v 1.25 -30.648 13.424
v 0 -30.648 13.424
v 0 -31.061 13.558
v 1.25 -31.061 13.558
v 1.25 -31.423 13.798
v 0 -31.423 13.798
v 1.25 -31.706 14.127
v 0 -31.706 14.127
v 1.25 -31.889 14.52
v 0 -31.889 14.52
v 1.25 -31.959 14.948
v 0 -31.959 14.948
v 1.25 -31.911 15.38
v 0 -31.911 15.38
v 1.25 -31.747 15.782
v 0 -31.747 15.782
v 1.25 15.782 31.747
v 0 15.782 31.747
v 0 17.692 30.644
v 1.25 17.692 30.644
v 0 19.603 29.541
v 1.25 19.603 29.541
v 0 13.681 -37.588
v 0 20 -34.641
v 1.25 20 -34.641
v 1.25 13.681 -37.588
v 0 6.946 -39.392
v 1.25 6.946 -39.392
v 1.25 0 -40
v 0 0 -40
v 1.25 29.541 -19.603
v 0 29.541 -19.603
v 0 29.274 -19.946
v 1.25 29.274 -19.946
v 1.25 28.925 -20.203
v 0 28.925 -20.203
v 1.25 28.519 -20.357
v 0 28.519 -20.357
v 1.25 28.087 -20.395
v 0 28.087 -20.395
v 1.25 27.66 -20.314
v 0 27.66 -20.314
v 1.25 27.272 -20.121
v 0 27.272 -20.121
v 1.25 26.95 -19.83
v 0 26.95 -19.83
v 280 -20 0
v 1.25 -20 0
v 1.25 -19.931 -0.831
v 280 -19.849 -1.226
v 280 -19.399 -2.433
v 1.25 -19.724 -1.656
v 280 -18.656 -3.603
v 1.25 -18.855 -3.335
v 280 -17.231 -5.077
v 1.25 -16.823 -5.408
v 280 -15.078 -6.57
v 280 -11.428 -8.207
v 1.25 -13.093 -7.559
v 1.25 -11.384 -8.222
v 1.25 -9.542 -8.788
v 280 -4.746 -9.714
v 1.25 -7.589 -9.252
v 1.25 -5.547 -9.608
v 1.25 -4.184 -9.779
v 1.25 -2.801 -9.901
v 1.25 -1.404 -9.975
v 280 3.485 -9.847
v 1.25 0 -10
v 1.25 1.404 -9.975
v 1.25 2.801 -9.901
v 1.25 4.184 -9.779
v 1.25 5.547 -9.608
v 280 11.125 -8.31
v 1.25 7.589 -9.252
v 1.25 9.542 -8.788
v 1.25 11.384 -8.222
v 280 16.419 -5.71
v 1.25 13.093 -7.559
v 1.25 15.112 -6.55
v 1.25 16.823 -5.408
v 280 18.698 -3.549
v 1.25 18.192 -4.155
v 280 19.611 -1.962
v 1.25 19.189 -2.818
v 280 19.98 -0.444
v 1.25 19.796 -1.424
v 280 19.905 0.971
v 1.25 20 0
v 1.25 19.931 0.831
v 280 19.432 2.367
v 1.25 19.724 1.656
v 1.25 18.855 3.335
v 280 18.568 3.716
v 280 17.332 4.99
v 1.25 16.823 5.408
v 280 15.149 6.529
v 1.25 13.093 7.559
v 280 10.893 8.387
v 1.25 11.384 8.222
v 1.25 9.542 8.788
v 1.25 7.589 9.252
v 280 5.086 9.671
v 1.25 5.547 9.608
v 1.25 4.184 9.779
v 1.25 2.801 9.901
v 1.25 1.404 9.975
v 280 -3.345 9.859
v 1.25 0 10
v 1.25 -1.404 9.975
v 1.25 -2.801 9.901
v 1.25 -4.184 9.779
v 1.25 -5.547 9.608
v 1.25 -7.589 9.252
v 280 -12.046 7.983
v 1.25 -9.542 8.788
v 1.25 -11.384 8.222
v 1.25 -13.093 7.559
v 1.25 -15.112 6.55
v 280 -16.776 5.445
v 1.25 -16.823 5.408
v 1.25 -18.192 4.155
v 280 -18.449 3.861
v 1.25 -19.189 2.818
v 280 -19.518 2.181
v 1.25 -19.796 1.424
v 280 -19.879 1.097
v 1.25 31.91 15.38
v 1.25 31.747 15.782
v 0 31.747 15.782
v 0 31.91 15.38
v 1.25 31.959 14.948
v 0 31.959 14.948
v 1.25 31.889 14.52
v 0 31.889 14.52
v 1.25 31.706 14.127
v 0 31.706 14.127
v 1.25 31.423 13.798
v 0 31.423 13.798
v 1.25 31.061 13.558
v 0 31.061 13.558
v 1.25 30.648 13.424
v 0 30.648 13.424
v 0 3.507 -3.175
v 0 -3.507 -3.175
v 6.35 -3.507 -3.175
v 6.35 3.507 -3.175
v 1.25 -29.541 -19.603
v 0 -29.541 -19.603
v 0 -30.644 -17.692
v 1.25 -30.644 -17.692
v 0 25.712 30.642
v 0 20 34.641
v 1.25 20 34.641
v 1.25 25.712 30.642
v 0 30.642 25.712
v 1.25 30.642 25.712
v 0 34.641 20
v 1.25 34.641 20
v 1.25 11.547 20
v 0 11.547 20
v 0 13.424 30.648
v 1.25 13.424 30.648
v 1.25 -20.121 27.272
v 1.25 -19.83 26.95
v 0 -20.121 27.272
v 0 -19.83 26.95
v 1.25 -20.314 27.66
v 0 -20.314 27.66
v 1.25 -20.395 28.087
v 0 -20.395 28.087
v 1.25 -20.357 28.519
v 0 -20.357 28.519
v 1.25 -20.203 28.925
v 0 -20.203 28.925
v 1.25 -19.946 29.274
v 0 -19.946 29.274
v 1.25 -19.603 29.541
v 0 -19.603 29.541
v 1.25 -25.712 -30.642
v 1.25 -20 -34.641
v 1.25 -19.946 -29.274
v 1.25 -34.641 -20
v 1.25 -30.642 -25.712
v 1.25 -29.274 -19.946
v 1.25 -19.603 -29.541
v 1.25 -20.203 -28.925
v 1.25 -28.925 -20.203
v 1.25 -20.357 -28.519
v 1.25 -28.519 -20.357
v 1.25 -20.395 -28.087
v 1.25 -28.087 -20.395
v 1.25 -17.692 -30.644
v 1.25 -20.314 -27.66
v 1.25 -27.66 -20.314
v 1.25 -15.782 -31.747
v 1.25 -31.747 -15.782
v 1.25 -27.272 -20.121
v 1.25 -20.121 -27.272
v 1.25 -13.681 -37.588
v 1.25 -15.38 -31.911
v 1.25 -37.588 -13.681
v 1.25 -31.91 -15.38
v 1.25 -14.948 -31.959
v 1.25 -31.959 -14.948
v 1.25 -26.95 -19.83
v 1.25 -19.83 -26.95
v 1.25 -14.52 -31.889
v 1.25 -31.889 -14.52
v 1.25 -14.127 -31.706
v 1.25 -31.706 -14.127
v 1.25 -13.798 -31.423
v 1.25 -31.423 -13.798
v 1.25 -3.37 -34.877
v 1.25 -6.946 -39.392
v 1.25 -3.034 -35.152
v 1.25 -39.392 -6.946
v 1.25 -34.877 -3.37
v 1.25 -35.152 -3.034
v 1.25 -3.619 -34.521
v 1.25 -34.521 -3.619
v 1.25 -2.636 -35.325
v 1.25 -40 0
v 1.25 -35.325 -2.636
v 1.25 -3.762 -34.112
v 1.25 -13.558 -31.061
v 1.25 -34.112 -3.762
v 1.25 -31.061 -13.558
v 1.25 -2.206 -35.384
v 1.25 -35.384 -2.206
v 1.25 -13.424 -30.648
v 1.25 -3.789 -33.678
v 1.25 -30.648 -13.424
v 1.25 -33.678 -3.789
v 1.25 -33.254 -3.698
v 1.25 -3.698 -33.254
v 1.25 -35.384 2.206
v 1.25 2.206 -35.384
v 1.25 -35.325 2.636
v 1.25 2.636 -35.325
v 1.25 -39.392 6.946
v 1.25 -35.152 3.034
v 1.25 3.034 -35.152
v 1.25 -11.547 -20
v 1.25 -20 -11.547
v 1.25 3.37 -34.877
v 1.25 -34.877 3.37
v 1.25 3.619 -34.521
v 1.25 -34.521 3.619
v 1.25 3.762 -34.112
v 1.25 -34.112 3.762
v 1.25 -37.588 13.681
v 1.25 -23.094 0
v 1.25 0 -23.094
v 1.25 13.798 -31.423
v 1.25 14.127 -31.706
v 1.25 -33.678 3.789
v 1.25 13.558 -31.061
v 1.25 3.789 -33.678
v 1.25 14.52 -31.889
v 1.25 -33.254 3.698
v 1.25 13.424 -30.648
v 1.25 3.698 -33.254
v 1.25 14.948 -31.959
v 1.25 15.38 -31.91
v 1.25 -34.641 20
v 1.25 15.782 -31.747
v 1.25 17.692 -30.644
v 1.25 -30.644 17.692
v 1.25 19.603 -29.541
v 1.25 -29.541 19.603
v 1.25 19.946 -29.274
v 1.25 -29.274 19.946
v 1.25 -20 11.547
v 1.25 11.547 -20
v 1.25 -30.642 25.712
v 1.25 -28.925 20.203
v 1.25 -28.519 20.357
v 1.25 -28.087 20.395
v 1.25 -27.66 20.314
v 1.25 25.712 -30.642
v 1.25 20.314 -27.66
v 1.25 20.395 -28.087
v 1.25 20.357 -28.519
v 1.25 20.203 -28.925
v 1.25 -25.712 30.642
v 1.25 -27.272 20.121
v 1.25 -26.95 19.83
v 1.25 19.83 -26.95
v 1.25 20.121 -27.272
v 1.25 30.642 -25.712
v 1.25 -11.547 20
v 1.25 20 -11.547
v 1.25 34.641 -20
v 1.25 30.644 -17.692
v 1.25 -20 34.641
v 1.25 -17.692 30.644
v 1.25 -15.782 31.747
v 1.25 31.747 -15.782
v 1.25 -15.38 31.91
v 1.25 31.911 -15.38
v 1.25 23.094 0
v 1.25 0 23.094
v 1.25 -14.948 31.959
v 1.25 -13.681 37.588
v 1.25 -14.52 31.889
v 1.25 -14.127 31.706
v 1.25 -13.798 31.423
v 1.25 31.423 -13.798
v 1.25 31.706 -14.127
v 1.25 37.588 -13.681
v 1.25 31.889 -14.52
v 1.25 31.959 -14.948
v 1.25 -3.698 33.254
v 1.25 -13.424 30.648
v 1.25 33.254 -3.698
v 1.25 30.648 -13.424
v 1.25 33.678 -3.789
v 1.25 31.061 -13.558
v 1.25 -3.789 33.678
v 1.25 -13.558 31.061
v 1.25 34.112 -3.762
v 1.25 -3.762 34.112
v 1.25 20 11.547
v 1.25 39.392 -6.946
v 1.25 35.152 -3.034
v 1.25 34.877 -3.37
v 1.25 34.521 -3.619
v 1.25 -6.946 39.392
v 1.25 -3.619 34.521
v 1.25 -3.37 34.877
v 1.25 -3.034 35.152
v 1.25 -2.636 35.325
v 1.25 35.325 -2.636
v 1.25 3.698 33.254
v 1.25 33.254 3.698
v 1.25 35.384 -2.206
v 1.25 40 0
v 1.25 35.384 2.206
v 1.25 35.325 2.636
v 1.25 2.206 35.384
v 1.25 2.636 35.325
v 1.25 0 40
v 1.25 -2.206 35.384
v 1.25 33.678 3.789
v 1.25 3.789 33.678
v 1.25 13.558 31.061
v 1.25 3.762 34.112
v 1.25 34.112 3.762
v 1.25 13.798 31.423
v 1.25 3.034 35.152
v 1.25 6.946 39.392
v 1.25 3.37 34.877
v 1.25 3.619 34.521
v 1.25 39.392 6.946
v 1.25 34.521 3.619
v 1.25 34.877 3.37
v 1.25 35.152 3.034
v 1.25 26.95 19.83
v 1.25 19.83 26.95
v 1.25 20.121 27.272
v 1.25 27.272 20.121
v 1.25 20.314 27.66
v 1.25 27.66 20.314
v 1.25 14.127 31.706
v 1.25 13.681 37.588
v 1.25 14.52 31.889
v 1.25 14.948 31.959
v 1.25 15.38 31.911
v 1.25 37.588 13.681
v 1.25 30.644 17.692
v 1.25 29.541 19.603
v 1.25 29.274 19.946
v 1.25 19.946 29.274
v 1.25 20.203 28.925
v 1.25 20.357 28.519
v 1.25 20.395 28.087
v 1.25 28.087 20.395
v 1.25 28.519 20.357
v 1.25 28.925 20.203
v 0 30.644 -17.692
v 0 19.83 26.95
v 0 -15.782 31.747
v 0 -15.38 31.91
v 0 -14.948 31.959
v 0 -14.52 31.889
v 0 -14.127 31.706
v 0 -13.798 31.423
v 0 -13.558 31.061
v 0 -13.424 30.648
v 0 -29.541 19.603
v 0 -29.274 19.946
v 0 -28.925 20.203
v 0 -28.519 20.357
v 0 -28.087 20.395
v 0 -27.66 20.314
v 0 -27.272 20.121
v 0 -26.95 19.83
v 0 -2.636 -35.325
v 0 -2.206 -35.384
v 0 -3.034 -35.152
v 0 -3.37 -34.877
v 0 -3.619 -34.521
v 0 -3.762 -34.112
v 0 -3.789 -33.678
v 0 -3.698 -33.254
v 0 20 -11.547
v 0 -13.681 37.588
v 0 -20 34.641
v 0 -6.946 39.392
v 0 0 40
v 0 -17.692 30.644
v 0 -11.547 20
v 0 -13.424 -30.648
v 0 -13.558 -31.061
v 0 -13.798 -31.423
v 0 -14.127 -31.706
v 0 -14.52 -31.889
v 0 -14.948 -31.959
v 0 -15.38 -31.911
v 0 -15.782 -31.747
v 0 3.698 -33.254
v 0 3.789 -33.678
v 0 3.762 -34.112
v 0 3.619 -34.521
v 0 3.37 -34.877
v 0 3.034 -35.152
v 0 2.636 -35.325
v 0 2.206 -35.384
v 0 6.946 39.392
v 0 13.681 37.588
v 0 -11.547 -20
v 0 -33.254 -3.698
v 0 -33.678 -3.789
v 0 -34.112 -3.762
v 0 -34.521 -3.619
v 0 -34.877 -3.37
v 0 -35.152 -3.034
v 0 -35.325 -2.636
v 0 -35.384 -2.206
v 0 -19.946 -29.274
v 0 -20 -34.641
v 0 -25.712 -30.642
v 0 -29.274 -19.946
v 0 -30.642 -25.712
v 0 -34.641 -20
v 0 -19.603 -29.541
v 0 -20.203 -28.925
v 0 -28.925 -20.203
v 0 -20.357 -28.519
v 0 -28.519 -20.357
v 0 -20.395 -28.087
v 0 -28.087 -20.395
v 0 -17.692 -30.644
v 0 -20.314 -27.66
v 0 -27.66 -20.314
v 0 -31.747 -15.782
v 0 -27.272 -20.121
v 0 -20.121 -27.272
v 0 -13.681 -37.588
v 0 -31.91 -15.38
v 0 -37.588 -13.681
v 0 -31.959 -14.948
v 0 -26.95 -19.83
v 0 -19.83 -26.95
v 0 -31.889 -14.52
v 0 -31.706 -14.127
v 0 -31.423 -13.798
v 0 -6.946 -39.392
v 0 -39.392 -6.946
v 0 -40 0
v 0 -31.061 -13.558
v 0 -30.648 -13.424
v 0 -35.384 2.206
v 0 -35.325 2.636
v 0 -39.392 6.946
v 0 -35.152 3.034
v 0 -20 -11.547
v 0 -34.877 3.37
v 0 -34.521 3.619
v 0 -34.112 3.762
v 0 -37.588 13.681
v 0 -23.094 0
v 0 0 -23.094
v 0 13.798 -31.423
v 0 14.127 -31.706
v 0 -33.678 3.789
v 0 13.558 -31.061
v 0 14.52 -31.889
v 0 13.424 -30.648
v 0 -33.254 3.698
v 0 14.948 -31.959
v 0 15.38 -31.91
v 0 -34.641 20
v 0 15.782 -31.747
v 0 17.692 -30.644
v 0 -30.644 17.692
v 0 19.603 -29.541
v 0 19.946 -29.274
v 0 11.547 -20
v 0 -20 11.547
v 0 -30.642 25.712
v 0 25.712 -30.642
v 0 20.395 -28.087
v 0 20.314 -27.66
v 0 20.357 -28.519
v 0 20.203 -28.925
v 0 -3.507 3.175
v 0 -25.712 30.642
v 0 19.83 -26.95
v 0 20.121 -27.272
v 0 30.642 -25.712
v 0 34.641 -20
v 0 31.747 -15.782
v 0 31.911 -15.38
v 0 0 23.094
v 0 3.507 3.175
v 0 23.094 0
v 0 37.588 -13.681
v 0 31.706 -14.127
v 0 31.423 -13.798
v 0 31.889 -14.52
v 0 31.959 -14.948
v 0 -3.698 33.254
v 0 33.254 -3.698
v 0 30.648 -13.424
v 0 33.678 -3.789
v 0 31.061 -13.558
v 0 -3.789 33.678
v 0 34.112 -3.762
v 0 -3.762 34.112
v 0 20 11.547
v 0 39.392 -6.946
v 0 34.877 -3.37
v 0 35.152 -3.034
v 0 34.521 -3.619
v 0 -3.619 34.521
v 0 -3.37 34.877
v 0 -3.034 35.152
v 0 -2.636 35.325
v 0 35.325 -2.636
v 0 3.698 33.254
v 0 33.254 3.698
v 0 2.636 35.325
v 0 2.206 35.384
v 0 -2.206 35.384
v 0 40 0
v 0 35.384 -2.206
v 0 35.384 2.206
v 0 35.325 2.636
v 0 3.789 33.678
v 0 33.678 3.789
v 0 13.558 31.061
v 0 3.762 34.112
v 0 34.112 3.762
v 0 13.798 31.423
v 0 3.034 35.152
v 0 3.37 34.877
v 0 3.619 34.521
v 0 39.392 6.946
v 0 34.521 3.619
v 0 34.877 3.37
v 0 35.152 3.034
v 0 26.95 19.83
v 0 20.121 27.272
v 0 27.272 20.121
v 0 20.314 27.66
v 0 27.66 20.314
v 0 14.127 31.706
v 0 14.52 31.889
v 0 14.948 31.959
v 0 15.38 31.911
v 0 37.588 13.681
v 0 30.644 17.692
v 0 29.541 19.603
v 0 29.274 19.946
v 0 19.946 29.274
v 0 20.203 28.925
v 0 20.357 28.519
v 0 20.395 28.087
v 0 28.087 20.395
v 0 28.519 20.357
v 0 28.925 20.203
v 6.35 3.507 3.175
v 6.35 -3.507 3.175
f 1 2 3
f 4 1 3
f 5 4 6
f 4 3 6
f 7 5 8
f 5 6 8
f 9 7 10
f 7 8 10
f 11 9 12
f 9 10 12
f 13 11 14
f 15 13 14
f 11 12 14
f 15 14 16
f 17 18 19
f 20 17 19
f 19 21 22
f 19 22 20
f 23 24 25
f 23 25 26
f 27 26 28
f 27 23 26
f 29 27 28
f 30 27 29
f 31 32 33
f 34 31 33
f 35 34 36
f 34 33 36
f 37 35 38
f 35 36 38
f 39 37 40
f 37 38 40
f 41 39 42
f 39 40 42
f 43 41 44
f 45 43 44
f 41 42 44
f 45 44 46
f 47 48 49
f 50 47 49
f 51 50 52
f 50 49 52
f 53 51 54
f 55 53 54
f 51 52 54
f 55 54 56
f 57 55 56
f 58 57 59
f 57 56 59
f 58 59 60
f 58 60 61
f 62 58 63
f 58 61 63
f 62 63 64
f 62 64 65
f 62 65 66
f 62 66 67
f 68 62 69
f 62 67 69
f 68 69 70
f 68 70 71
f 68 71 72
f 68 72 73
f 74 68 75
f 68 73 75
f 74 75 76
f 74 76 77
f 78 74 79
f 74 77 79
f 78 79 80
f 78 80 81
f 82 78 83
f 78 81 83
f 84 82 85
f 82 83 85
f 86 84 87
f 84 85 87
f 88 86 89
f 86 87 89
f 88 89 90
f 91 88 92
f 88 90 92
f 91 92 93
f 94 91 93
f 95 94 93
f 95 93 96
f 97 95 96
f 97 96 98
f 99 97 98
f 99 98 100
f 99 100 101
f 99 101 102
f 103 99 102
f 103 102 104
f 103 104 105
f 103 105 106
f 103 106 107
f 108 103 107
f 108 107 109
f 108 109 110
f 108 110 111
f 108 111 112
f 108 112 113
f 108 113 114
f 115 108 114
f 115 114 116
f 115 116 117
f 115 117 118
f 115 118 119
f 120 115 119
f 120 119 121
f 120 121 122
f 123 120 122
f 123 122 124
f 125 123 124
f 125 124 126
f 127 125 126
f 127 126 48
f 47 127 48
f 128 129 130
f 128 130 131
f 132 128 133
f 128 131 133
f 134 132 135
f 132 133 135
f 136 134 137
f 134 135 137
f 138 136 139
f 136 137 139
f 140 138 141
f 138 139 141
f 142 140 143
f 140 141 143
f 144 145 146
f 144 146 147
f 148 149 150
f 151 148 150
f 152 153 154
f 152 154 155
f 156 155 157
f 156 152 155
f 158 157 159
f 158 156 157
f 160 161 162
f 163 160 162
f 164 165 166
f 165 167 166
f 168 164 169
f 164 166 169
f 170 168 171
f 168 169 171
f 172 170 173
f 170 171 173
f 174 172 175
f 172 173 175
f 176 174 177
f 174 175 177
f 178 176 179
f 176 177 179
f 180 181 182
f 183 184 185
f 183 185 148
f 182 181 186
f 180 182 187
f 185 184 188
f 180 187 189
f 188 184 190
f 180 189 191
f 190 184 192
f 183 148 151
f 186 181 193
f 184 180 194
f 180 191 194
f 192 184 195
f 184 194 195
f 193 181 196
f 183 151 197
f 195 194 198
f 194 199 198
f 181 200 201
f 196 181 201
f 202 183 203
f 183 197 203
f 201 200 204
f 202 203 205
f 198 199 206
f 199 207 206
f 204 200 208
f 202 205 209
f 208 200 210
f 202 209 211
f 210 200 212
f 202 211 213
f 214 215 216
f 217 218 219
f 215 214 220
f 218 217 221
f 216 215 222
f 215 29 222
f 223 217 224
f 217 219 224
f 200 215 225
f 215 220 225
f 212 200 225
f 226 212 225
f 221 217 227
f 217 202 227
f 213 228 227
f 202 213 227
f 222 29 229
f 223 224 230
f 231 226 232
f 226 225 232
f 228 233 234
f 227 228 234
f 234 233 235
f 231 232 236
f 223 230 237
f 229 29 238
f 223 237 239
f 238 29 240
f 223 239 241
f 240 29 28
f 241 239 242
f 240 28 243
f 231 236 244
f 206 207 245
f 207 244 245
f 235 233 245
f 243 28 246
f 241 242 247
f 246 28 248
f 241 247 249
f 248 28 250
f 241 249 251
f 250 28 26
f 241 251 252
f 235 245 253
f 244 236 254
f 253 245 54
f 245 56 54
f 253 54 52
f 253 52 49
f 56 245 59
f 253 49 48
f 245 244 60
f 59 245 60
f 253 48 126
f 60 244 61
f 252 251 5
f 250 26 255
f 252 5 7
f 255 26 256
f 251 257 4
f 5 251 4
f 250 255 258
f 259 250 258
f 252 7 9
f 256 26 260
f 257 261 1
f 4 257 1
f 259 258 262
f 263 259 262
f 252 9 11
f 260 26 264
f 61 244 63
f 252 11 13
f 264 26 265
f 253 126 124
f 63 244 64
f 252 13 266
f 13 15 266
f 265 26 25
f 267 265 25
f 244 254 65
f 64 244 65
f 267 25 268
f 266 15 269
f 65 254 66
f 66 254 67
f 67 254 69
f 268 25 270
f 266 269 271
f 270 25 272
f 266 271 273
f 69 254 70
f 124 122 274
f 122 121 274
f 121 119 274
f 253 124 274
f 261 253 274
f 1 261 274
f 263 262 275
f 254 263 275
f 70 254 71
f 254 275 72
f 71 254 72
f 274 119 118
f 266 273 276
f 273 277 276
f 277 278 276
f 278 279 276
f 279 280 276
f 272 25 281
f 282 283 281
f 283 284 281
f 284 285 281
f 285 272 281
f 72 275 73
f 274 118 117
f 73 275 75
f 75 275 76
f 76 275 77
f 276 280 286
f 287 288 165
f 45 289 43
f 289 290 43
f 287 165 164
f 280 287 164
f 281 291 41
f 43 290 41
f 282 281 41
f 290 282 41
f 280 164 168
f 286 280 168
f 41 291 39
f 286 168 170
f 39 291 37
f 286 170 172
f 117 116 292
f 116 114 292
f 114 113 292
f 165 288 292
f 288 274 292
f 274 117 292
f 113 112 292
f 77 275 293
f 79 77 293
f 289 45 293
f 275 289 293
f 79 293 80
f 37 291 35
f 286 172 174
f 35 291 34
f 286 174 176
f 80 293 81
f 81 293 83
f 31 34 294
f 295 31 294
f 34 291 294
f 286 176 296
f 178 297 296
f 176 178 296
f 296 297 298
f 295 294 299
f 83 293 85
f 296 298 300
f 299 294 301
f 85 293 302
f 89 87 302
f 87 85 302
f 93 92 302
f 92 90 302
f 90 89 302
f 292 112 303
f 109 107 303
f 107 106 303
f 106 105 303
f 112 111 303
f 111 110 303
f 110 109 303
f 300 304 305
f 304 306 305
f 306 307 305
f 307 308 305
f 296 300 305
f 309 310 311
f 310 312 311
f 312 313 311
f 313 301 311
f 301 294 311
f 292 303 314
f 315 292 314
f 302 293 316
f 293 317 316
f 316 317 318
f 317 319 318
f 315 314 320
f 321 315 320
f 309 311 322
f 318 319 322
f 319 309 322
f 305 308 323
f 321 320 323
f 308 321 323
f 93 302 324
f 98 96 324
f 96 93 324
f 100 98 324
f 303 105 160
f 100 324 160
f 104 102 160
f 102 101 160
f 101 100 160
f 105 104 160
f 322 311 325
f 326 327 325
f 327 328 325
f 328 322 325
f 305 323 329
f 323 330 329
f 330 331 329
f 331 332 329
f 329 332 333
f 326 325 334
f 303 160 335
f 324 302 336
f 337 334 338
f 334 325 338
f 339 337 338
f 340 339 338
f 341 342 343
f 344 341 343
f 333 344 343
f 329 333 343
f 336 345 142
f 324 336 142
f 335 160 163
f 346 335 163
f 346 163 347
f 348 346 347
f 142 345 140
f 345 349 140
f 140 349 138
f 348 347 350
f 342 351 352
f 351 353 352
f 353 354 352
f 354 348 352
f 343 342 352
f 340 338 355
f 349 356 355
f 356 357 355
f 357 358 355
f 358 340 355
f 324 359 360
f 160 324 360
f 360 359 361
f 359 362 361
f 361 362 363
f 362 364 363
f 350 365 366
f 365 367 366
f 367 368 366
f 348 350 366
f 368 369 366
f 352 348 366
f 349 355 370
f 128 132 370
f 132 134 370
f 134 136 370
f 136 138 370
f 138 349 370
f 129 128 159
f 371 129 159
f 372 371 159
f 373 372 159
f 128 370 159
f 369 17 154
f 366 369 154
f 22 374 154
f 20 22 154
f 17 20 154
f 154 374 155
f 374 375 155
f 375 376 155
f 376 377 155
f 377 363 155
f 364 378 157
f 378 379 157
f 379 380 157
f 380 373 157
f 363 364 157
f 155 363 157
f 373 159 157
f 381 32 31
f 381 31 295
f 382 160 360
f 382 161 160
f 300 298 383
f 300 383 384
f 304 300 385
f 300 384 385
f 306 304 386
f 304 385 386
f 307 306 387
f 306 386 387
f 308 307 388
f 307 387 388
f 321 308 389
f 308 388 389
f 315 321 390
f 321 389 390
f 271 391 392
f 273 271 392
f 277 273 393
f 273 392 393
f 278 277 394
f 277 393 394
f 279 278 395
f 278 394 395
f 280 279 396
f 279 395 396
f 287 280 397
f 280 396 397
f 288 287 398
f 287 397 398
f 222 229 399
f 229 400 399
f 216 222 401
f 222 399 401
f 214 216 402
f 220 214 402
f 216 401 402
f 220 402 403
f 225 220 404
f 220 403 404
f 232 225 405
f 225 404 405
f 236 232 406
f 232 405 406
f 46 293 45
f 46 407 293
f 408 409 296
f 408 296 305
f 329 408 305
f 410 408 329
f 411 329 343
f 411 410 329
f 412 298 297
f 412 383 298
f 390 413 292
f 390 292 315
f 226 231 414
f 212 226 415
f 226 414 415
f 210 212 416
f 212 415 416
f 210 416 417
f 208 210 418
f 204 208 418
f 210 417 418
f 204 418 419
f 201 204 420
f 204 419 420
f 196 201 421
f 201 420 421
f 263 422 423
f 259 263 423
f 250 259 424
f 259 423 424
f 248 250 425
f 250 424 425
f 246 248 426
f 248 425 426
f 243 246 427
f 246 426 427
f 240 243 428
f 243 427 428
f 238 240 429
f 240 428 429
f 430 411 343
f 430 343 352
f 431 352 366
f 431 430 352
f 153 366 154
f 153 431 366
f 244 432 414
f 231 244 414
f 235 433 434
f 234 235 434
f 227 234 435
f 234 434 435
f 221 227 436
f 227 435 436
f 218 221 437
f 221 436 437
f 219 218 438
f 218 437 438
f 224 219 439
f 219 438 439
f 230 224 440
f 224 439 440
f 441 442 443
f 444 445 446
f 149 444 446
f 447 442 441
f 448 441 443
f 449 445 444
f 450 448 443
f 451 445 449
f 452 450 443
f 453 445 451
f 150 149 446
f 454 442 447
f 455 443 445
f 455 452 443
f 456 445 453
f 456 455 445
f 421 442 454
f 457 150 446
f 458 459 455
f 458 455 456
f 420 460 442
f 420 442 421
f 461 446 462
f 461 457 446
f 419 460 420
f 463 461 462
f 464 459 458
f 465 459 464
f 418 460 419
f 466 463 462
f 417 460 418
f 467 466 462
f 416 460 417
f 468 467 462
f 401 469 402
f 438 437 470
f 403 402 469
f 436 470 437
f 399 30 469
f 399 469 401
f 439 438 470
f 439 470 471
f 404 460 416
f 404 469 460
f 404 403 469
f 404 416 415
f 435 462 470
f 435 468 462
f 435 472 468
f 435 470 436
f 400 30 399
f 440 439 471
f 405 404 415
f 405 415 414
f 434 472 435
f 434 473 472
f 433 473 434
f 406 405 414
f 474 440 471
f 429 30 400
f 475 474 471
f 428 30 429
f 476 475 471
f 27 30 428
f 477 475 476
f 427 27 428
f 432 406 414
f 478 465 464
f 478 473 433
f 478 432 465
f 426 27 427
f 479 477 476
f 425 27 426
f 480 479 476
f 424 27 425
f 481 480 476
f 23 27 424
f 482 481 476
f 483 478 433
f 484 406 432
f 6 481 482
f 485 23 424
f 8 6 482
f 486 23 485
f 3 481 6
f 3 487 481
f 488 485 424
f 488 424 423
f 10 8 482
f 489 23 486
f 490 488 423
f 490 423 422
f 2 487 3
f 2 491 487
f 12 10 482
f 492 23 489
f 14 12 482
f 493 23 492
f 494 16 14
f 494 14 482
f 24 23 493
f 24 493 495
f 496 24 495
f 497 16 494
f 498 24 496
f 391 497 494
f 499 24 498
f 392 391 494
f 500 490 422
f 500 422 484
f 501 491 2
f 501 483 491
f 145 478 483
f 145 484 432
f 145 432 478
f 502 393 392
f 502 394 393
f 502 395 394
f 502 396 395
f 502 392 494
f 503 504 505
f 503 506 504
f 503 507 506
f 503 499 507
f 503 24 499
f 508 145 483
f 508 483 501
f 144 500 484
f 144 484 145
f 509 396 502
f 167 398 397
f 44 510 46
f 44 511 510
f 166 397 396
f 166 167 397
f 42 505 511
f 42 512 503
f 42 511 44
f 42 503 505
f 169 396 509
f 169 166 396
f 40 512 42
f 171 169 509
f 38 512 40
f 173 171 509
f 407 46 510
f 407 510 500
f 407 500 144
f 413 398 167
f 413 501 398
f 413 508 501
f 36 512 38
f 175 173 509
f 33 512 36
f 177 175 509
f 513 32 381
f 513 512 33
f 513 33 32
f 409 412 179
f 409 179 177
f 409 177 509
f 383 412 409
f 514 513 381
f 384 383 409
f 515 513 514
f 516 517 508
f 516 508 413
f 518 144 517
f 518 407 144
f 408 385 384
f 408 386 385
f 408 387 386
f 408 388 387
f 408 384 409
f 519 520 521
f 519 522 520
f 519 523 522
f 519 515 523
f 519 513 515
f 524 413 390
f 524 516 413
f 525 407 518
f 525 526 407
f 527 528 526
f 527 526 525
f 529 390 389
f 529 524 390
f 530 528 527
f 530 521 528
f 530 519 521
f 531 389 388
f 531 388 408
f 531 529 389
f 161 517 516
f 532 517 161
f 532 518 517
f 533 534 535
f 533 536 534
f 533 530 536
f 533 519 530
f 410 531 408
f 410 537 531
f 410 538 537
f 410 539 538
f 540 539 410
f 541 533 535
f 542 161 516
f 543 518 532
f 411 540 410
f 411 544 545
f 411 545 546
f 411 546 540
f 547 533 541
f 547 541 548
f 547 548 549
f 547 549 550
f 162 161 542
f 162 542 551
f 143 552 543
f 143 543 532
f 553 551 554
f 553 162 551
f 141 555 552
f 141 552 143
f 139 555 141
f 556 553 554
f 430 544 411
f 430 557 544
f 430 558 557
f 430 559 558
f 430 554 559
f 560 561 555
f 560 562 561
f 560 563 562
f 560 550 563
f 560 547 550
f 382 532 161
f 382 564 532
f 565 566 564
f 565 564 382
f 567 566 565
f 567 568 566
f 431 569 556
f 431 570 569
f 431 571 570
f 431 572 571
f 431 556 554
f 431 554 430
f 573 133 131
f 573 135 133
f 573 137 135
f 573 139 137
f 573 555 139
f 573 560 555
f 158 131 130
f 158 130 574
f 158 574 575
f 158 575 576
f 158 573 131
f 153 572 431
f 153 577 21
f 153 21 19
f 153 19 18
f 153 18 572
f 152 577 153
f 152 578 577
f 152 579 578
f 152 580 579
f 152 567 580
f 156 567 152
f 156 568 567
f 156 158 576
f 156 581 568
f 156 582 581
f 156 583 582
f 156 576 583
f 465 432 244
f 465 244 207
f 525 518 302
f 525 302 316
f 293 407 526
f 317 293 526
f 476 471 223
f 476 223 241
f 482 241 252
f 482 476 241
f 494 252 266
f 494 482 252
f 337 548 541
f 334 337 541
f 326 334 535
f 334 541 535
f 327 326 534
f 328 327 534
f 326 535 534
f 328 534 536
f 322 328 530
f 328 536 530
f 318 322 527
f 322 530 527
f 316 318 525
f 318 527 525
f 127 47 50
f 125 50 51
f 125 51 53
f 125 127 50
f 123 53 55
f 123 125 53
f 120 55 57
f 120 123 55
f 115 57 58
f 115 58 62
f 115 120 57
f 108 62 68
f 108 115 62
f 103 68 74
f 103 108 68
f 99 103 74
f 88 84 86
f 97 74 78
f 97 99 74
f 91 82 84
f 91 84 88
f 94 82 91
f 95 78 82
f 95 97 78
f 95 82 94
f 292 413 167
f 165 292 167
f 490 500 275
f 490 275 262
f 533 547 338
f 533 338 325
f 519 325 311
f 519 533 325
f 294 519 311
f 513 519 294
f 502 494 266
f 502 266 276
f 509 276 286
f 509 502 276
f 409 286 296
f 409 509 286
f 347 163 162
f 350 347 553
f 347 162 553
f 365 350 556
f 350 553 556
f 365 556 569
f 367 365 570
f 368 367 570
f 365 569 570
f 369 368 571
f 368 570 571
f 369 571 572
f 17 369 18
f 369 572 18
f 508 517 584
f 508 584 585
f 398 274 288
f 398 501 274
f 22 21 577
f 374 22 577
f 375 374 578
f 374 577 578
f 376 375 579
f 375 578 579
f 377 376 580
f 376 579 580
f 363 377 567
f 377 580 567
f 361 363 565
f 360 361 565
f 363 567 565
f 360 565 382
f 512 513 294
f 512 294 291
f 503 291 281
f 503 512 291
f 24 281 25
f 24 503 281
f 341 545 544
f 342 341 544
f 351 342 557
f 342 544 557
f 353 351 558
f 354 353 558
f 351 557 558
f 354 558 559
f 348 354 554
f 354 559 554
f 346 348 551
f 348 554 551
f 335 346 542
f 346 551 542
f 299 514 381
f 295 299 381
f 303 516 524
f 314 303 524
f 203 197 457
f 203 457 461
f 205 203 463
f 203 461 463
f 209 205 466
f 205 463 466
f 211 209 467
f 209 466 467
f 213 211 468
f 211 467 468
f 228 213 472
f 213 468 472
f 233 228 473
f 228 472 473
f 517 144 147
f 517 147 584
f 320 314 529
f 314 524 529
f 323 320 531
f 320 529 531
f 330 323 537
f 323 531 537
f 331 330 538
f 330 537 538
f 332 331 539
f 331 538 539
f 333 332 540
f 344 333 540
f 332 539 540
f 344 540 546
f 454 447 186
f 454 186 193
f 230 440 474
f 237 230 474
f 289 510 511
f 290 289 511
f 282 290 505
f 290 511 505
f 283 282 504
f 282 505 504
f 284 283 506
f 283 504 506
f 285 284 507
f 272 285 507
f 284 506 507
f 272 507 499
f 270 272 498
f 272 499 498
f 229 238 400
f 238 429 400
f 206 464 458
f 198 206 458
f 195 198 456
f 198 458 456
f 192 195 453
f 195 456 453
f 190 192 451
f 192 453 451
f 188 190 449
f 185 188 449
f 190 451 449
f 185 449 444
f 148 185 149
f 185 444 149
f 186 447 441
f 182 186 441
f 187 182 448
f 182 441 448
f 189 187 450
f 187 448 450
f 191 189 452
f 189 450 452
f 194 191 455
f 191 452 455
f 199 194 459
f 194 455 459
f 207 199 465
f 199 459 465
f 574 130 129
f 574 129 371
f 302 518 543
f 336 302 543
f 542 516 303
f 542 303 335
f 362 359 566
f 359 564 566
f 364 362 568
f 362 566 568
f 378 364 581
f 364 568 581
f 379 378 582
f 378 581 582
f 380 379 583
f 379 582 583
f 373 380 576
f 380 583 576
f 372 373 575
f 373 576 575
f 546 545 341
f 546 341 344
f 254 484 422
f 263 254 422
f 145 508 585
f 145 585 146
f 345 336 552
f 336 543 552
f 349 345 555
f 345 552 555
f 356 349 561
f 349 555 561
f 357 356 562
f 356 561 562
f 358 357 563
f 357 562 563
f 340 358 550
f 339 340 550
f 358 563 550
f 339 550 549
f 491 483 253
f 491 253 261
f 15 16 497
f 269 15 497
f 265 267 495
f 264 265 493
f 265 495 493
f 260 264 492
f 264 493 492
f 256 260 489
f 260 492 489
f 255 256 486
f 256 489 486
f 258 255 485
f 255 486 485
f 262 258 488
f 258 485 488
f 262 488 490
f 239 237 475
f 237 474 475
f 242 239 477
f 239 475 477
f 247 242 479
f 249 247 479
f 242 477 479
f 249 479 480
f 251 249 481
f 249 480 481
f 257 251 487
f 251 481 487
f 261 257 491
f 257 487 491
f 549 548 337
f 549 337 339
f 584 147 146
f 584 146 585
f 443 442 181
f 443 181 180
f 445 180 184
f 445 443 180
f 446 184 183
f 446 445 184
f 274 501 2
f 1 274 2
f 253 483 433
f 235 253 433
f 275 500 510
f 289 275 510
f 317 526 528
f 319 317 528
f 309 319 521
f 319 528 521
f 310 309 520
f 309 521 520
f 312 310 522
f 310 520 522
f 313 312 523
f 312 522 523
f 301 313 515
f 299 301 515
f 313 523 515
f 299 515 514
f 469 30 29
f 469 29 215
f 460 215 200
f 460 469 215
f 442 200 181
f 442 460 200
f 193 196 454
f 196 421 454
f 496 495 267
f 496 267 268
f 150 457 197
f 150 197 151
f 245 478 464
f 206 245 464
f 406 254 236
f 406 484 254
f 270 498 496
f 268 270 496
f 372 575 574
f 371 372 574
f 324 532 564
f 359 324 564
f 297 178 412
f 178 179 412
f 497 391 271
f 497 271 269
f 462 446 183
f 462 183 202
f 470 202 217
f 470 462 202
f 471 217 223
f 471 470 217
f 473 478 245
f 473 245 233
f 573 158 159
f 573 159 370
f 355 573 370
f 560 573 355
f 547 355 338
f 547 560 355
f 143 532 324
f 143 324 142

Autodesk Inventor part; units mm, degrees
ref_plane "YZ Plane" through (0, 0, 0) normal (1, 0, 0) x (0, 1, 0)
ref_plane "XZ Plane" through (0, 0, 0) normal (0, 1, 0) x (-1, 0, 0)
ref_plane "XY Plane" through (0, 0, 0) normal (0, 0, 1) x (1, 0, 0)
sketch "Sketch4" plane through (0, 0, 0) normal (1, 0, 0) x (0, 1, 0)
  ellipse E0 centre (0, 0) end of major axis (-20, 0) minor radius 10
  dimension "d32" = 20
  dimension "d33" = 10
extrude "Extrusion1" add sketch "Sketch4" along normal blind 280
sketch "Sketch5" plane through (0, 0, 0) normal (-1, 0, 0) x (0, 0, 1)
  ellipse E0 centre (0, 0) end of major axis (0, 40) minor radius 40
  ellipse E1 centre (0, 0) end of major axis (0, -20) minor radius 10 projected
  line L0 (0, 0) -> (0, 40)
  line L1 (0, 0) -> (-20, 34.641)
  line L2 (0, 0) -> (-34.641, 20)
  line L3 (0, 0) -> (-40, 0)
  line L4 (0, 0) -> (-34.641, -20)
  line L5 (0, 0) -> (-20, -34.641)
  line L6 (0, 0) -> (0, -40)
  line L7 (0, 0) -> (20, -34.641)
  line L8 (0, 0) -> (34.641, -20)
  line L9 (0, 0) -> (40, 0)
  line L10 (0, 0) -> (34.641, 20)
  line L11 (0, 0) -> (20, 34.641)
  line L12 (0, 23.094) -> (3.6979, 33.254)
  line L13 (2.2062, 35.3845) -> (0, 35.3845)
  arc A0 (3.6979, 33.254) -> (2.2062, 35.3845) centre (2.2062, 33.797) ccw
  line L14 (0, 23.094) -> (-3.6979, 33.254)
  line L15 (-2.2062, 35.3845) -> (0, 35.3845)
  arc A1 (-2.2062, 35.3845) -> (-3.6979, 33.254) centre (-2.2062, 33.797) ccw
  line L16 (-15.7816, 31.7469) -> (-17.6922, 30.6438)
  line L17 (-19.6028, 29.5408) -> (-17.6922, 30.6438)
  arc A2 (-19.6028, 29.5408) -> (-19.8295, 26.9498) centre (-18.8091, 28.1659) ccw
  line L18 (-11.547, 20) -> (-19.8295, 26.9498)
  line L19 (-11.547, 20) -> (-13.4245, 30.6478)
  arc A3 (-13.4245, 30.6478) -> (-15.7816, 31.7469) centre (-14.9879, 30.3721) ccw
  line L20 (-29.5408, 19.6028) -> (-30.6438, 17.6922)
  line L21 (-31.7469, 15.7816) -> (-30.6438, 17.6922)
  arc A4 (-31.7469, 15.7816) -> (-30.6478, 13.4245) centre (-30.3721, 14.9879) ccw
  line L22 (-20, 11.547) -> (-30.6478, 13.4245)
  line L23 (-20, 11.547) -> (-26.9498, 19.8295)
  arc A5 (-26.9498, 19.8295) -> (-29.5408, 19.6028) centre (-28.1659, 18.8091) ccw
  line L24 (-35.3845, 2.2062) -> (-35.3845, 0)
  line L25 (-35.3845, -2.2062) -> (-35.3845, 0)
  arc A6 (-35.3845, -2.2062) -> (-33.254, -3.6979) centre (-33.797, -2.2062) ccw
  line L26 (-23.094, 0) -> (-33.254, -3.6979)
  line L27 (-23.094, 0) -> (-33.254, 3.6979)
  arc A7 (-33.254, 3.6979) -> (-35.3845, 2.2062) centre (-33.797, 2.2062) ccw
  line L28 (-31.7469, -15.7816) -> (-30.6438, -17.6922)
  line L29 (-29.5408, -19.6028) -> (-30.6438, -17.6922)
  arc A8 (-29.5408, -19.6028) -> (-26.9498, -19.8295) centre (-28.1659, -18.8091) ccw
  line L30 (-20, -11.547) -> (-26.9498, -19.8295)
  line L31 (-20, -11.547) -> (-30.6478, -13.4245)
  arc A9 (-30.6478, -13.4245) -> (-31.7469, -15.7816) centre (-30.3721, -14.9879) ccw
  line L32 (-19.6028, -29.5408) -> (-17.6922, -30.6438)
  line L33 (-15.7816, -31.7469) -> (-17.6922, -30.6438)
  arc A10 (-15.7816, -31.7469) -> (-13.4245, -30.6478) centre (-14.9879, -30.3721) ccw
  line L34 (-11.547, -20) -> (-13.4245, -30.6478)
  line L35 (-11.547, -20) -> (-19.8295, -26.9498)
  arc A11 (-19.8295, -26.9498) -> (-19.6028, -29.5408) centre (-18.8091, -28.1659) ccw
  line L36 (-2.2062, -35.3845) -> (0, -35.3845)
  line L37 (2.2062, -35.3845) -> (0, -35.3845)
  arc A12 (2.2062, -35.3845) -> (3.6979, -33.254) centre (2.2062, -33.797) ccw
  line L38 (0, -23.094) -> (3.6979, -33.254)
  line L39 (0, -23.094) -> (-3.6979, -33.254)
  arc A13 (-3.6979, -33.254) -> (-2.2062, -35.3845) centre (-2.2062, -33.797) ccw
  line L40 (15.7816, -31.7469) -> (17.6922, -30.6438)
  line L41 (19.6028, -29.5408) -> (17.6922, -30.6438)
  arc A14 (19.6028, -29.5408) -> (19.8295, -26.9498) centre (18.8091, -28.1659) ccw
  line L42 (11.547, -20) -> (19.8295, -26.9498)
  line L43 (11.547, -20) -> (13.4245, -30.6478)
  arc A15 (13.4245, -30.6478) -> (15.7816, -31.7469) centre (14.9879, -30.3721) ccw
  line L44 (29.5408, -19.6028) -> (30.6438, -17.6922)
  line L45 (31.7469, -15.7816) -> (30.6438, -17.6922)
  arc A16 (31.7469, -15.7816) -> (30.6478, -13.4245) centre (30.3721, -14.9879) ccw
  line L46 (20, -11.547) -> (30.6478, -13.4245)
  line L47 (20, -11.547) -> (26.9498, -19.8295)
  arc A17 (26.9498, -19.8295) -> (29.5408, -19.6028) centre (28.1659, -18.8091) ccw
  line L48 (35.3845, -2.2062) -> (35.3845, 0)
  line L49 (35.3845, 2.2062) -> (35.3845, 0)
  arc A18 (35.3845, 2.2062) -> (33.254, 3.6979) centre (33.797, 2.2062) ccw
  line L50 (23.094, 0) -> (33.254, 3.6979)
  line L51 (23.094, 0) -> (33.254, -3.6979)
  arc A19 (33.254, -3.6979) -> (35.3845, -2.2062) centre (33.797, -2.2062) ccw
  line L52 (31.7469, 15.7816) -> (30.6438, 17.6922)
  line L53 (29.5408, 19.6028) -> (30.6438, 17.6922)
  arc A20 (29.5408, 19.6028) -> (26.9498, 19.8295) centre (28.1659, 18.8091) ccw
  line L54 (20, 11.547) -> (26.9498, 19.8295)
  line L55 (20, 11.547) -> (30.6478, 13.4245)
  arc A21 (30.6478, 13.4245) -> (31.7469, 15.7816) centre (30.3721, 14.9879) ccw
  line L56 (19.6028, 29.5408) -> (17.6922, 30.6438)
  line L57 (15.7816, 31.7469) -> (17.6922, 30.6438)
  arc A22 (15.7816, 31.7469) -> (13.4245, 30.6478) centre (14.9879, 30.3721) ccw
  line L58 (11.547, 20) -> (13.4245, 30.6478)
  line L59 (11.547, 20) -> (19.8295, 26.9498)
  arc A23 (19.8295, 26.9498) -> (19.6028, 29.5408) centre (18.8091, 28.1659) ccw
  line L60 (-3.175, 3.5066) -> (3.175, 3.5066)
  line L61 (3.175, 3.5066) -> (3.175, -3.5066)
  line L62 (3.175, -3.5066) -> (-3.175, -3.5066)
  line L63 (-3.175, -3.5066) -> (-3.175, 3.5066)
  line L64 (-3.175, 3.5066) -> (3.175, -3.5066) construction
  line L65 (3.175, 3.5066) -> (-3.175, -3.5066) construction
  dimension "d36" = 40
  dimension "d40" = 40
  dimension "d43" = 360
  dimension "d45" = 1.5875
  dimension "d46" = 10.16
  dimension "d47" = 20
  dimension "d50" = 360
  dimension "d52" = 6.35
extrude "Extrusion2" add sketch "Sketch5" against normal blind 1.25 contours L0 L15 A1 L14 E1 L1 L19 A3 L16 E0 | E0 L11 L57 A22 L58 E1 L0 L12 A0 L13 | L1 L17 A2 L18 E1 L2 L23 A5 L20 E0 | E0 L10 L53 A20 L54 E1 L11 L59 A23 L56 | L2 L21 A4 L22 E1 L3 L27 A7 L24 E0 | E0 L9 L49 A18 L50 E1 L10 L55 A21 L52 | L3 L25 A6 L26 E1 L4 L31 A9 L28 E0 | E0 L8 L45 A16 L46 E1 L9 L51 A19 L48 | L4 L29 A8 L30 E1 L5 L35 A11 L32 E0 | E0 L7 L41 A14 L42 E1 L8 L47 A17 L44 | L5 L33 A10 L34 E1 L6 L39 A13 L36 E0 | E0 L6 L37 A12 L38 E1 L7 L43 A15 L40
extrude "Extrusion3" cut sketch "Sketch5" against normal blind 6.35 contours L60 L11 L0 | L0 L1 L60 | L1 L2 L63 L60 | L60 L61 L10 L11 | L3 L63 L2 | L4 L63 L3 | L5 L62 L63 L4 | L6 L62 L5 | L7 L62 L6 | L8 L61 L62 L7 | L9 L61 L8 | L10 L61 L9
equation "\"d33\" = 0.5 * d32"
equation "\"d36\" = d40"
properties part number "tanjiro's sword hold"
